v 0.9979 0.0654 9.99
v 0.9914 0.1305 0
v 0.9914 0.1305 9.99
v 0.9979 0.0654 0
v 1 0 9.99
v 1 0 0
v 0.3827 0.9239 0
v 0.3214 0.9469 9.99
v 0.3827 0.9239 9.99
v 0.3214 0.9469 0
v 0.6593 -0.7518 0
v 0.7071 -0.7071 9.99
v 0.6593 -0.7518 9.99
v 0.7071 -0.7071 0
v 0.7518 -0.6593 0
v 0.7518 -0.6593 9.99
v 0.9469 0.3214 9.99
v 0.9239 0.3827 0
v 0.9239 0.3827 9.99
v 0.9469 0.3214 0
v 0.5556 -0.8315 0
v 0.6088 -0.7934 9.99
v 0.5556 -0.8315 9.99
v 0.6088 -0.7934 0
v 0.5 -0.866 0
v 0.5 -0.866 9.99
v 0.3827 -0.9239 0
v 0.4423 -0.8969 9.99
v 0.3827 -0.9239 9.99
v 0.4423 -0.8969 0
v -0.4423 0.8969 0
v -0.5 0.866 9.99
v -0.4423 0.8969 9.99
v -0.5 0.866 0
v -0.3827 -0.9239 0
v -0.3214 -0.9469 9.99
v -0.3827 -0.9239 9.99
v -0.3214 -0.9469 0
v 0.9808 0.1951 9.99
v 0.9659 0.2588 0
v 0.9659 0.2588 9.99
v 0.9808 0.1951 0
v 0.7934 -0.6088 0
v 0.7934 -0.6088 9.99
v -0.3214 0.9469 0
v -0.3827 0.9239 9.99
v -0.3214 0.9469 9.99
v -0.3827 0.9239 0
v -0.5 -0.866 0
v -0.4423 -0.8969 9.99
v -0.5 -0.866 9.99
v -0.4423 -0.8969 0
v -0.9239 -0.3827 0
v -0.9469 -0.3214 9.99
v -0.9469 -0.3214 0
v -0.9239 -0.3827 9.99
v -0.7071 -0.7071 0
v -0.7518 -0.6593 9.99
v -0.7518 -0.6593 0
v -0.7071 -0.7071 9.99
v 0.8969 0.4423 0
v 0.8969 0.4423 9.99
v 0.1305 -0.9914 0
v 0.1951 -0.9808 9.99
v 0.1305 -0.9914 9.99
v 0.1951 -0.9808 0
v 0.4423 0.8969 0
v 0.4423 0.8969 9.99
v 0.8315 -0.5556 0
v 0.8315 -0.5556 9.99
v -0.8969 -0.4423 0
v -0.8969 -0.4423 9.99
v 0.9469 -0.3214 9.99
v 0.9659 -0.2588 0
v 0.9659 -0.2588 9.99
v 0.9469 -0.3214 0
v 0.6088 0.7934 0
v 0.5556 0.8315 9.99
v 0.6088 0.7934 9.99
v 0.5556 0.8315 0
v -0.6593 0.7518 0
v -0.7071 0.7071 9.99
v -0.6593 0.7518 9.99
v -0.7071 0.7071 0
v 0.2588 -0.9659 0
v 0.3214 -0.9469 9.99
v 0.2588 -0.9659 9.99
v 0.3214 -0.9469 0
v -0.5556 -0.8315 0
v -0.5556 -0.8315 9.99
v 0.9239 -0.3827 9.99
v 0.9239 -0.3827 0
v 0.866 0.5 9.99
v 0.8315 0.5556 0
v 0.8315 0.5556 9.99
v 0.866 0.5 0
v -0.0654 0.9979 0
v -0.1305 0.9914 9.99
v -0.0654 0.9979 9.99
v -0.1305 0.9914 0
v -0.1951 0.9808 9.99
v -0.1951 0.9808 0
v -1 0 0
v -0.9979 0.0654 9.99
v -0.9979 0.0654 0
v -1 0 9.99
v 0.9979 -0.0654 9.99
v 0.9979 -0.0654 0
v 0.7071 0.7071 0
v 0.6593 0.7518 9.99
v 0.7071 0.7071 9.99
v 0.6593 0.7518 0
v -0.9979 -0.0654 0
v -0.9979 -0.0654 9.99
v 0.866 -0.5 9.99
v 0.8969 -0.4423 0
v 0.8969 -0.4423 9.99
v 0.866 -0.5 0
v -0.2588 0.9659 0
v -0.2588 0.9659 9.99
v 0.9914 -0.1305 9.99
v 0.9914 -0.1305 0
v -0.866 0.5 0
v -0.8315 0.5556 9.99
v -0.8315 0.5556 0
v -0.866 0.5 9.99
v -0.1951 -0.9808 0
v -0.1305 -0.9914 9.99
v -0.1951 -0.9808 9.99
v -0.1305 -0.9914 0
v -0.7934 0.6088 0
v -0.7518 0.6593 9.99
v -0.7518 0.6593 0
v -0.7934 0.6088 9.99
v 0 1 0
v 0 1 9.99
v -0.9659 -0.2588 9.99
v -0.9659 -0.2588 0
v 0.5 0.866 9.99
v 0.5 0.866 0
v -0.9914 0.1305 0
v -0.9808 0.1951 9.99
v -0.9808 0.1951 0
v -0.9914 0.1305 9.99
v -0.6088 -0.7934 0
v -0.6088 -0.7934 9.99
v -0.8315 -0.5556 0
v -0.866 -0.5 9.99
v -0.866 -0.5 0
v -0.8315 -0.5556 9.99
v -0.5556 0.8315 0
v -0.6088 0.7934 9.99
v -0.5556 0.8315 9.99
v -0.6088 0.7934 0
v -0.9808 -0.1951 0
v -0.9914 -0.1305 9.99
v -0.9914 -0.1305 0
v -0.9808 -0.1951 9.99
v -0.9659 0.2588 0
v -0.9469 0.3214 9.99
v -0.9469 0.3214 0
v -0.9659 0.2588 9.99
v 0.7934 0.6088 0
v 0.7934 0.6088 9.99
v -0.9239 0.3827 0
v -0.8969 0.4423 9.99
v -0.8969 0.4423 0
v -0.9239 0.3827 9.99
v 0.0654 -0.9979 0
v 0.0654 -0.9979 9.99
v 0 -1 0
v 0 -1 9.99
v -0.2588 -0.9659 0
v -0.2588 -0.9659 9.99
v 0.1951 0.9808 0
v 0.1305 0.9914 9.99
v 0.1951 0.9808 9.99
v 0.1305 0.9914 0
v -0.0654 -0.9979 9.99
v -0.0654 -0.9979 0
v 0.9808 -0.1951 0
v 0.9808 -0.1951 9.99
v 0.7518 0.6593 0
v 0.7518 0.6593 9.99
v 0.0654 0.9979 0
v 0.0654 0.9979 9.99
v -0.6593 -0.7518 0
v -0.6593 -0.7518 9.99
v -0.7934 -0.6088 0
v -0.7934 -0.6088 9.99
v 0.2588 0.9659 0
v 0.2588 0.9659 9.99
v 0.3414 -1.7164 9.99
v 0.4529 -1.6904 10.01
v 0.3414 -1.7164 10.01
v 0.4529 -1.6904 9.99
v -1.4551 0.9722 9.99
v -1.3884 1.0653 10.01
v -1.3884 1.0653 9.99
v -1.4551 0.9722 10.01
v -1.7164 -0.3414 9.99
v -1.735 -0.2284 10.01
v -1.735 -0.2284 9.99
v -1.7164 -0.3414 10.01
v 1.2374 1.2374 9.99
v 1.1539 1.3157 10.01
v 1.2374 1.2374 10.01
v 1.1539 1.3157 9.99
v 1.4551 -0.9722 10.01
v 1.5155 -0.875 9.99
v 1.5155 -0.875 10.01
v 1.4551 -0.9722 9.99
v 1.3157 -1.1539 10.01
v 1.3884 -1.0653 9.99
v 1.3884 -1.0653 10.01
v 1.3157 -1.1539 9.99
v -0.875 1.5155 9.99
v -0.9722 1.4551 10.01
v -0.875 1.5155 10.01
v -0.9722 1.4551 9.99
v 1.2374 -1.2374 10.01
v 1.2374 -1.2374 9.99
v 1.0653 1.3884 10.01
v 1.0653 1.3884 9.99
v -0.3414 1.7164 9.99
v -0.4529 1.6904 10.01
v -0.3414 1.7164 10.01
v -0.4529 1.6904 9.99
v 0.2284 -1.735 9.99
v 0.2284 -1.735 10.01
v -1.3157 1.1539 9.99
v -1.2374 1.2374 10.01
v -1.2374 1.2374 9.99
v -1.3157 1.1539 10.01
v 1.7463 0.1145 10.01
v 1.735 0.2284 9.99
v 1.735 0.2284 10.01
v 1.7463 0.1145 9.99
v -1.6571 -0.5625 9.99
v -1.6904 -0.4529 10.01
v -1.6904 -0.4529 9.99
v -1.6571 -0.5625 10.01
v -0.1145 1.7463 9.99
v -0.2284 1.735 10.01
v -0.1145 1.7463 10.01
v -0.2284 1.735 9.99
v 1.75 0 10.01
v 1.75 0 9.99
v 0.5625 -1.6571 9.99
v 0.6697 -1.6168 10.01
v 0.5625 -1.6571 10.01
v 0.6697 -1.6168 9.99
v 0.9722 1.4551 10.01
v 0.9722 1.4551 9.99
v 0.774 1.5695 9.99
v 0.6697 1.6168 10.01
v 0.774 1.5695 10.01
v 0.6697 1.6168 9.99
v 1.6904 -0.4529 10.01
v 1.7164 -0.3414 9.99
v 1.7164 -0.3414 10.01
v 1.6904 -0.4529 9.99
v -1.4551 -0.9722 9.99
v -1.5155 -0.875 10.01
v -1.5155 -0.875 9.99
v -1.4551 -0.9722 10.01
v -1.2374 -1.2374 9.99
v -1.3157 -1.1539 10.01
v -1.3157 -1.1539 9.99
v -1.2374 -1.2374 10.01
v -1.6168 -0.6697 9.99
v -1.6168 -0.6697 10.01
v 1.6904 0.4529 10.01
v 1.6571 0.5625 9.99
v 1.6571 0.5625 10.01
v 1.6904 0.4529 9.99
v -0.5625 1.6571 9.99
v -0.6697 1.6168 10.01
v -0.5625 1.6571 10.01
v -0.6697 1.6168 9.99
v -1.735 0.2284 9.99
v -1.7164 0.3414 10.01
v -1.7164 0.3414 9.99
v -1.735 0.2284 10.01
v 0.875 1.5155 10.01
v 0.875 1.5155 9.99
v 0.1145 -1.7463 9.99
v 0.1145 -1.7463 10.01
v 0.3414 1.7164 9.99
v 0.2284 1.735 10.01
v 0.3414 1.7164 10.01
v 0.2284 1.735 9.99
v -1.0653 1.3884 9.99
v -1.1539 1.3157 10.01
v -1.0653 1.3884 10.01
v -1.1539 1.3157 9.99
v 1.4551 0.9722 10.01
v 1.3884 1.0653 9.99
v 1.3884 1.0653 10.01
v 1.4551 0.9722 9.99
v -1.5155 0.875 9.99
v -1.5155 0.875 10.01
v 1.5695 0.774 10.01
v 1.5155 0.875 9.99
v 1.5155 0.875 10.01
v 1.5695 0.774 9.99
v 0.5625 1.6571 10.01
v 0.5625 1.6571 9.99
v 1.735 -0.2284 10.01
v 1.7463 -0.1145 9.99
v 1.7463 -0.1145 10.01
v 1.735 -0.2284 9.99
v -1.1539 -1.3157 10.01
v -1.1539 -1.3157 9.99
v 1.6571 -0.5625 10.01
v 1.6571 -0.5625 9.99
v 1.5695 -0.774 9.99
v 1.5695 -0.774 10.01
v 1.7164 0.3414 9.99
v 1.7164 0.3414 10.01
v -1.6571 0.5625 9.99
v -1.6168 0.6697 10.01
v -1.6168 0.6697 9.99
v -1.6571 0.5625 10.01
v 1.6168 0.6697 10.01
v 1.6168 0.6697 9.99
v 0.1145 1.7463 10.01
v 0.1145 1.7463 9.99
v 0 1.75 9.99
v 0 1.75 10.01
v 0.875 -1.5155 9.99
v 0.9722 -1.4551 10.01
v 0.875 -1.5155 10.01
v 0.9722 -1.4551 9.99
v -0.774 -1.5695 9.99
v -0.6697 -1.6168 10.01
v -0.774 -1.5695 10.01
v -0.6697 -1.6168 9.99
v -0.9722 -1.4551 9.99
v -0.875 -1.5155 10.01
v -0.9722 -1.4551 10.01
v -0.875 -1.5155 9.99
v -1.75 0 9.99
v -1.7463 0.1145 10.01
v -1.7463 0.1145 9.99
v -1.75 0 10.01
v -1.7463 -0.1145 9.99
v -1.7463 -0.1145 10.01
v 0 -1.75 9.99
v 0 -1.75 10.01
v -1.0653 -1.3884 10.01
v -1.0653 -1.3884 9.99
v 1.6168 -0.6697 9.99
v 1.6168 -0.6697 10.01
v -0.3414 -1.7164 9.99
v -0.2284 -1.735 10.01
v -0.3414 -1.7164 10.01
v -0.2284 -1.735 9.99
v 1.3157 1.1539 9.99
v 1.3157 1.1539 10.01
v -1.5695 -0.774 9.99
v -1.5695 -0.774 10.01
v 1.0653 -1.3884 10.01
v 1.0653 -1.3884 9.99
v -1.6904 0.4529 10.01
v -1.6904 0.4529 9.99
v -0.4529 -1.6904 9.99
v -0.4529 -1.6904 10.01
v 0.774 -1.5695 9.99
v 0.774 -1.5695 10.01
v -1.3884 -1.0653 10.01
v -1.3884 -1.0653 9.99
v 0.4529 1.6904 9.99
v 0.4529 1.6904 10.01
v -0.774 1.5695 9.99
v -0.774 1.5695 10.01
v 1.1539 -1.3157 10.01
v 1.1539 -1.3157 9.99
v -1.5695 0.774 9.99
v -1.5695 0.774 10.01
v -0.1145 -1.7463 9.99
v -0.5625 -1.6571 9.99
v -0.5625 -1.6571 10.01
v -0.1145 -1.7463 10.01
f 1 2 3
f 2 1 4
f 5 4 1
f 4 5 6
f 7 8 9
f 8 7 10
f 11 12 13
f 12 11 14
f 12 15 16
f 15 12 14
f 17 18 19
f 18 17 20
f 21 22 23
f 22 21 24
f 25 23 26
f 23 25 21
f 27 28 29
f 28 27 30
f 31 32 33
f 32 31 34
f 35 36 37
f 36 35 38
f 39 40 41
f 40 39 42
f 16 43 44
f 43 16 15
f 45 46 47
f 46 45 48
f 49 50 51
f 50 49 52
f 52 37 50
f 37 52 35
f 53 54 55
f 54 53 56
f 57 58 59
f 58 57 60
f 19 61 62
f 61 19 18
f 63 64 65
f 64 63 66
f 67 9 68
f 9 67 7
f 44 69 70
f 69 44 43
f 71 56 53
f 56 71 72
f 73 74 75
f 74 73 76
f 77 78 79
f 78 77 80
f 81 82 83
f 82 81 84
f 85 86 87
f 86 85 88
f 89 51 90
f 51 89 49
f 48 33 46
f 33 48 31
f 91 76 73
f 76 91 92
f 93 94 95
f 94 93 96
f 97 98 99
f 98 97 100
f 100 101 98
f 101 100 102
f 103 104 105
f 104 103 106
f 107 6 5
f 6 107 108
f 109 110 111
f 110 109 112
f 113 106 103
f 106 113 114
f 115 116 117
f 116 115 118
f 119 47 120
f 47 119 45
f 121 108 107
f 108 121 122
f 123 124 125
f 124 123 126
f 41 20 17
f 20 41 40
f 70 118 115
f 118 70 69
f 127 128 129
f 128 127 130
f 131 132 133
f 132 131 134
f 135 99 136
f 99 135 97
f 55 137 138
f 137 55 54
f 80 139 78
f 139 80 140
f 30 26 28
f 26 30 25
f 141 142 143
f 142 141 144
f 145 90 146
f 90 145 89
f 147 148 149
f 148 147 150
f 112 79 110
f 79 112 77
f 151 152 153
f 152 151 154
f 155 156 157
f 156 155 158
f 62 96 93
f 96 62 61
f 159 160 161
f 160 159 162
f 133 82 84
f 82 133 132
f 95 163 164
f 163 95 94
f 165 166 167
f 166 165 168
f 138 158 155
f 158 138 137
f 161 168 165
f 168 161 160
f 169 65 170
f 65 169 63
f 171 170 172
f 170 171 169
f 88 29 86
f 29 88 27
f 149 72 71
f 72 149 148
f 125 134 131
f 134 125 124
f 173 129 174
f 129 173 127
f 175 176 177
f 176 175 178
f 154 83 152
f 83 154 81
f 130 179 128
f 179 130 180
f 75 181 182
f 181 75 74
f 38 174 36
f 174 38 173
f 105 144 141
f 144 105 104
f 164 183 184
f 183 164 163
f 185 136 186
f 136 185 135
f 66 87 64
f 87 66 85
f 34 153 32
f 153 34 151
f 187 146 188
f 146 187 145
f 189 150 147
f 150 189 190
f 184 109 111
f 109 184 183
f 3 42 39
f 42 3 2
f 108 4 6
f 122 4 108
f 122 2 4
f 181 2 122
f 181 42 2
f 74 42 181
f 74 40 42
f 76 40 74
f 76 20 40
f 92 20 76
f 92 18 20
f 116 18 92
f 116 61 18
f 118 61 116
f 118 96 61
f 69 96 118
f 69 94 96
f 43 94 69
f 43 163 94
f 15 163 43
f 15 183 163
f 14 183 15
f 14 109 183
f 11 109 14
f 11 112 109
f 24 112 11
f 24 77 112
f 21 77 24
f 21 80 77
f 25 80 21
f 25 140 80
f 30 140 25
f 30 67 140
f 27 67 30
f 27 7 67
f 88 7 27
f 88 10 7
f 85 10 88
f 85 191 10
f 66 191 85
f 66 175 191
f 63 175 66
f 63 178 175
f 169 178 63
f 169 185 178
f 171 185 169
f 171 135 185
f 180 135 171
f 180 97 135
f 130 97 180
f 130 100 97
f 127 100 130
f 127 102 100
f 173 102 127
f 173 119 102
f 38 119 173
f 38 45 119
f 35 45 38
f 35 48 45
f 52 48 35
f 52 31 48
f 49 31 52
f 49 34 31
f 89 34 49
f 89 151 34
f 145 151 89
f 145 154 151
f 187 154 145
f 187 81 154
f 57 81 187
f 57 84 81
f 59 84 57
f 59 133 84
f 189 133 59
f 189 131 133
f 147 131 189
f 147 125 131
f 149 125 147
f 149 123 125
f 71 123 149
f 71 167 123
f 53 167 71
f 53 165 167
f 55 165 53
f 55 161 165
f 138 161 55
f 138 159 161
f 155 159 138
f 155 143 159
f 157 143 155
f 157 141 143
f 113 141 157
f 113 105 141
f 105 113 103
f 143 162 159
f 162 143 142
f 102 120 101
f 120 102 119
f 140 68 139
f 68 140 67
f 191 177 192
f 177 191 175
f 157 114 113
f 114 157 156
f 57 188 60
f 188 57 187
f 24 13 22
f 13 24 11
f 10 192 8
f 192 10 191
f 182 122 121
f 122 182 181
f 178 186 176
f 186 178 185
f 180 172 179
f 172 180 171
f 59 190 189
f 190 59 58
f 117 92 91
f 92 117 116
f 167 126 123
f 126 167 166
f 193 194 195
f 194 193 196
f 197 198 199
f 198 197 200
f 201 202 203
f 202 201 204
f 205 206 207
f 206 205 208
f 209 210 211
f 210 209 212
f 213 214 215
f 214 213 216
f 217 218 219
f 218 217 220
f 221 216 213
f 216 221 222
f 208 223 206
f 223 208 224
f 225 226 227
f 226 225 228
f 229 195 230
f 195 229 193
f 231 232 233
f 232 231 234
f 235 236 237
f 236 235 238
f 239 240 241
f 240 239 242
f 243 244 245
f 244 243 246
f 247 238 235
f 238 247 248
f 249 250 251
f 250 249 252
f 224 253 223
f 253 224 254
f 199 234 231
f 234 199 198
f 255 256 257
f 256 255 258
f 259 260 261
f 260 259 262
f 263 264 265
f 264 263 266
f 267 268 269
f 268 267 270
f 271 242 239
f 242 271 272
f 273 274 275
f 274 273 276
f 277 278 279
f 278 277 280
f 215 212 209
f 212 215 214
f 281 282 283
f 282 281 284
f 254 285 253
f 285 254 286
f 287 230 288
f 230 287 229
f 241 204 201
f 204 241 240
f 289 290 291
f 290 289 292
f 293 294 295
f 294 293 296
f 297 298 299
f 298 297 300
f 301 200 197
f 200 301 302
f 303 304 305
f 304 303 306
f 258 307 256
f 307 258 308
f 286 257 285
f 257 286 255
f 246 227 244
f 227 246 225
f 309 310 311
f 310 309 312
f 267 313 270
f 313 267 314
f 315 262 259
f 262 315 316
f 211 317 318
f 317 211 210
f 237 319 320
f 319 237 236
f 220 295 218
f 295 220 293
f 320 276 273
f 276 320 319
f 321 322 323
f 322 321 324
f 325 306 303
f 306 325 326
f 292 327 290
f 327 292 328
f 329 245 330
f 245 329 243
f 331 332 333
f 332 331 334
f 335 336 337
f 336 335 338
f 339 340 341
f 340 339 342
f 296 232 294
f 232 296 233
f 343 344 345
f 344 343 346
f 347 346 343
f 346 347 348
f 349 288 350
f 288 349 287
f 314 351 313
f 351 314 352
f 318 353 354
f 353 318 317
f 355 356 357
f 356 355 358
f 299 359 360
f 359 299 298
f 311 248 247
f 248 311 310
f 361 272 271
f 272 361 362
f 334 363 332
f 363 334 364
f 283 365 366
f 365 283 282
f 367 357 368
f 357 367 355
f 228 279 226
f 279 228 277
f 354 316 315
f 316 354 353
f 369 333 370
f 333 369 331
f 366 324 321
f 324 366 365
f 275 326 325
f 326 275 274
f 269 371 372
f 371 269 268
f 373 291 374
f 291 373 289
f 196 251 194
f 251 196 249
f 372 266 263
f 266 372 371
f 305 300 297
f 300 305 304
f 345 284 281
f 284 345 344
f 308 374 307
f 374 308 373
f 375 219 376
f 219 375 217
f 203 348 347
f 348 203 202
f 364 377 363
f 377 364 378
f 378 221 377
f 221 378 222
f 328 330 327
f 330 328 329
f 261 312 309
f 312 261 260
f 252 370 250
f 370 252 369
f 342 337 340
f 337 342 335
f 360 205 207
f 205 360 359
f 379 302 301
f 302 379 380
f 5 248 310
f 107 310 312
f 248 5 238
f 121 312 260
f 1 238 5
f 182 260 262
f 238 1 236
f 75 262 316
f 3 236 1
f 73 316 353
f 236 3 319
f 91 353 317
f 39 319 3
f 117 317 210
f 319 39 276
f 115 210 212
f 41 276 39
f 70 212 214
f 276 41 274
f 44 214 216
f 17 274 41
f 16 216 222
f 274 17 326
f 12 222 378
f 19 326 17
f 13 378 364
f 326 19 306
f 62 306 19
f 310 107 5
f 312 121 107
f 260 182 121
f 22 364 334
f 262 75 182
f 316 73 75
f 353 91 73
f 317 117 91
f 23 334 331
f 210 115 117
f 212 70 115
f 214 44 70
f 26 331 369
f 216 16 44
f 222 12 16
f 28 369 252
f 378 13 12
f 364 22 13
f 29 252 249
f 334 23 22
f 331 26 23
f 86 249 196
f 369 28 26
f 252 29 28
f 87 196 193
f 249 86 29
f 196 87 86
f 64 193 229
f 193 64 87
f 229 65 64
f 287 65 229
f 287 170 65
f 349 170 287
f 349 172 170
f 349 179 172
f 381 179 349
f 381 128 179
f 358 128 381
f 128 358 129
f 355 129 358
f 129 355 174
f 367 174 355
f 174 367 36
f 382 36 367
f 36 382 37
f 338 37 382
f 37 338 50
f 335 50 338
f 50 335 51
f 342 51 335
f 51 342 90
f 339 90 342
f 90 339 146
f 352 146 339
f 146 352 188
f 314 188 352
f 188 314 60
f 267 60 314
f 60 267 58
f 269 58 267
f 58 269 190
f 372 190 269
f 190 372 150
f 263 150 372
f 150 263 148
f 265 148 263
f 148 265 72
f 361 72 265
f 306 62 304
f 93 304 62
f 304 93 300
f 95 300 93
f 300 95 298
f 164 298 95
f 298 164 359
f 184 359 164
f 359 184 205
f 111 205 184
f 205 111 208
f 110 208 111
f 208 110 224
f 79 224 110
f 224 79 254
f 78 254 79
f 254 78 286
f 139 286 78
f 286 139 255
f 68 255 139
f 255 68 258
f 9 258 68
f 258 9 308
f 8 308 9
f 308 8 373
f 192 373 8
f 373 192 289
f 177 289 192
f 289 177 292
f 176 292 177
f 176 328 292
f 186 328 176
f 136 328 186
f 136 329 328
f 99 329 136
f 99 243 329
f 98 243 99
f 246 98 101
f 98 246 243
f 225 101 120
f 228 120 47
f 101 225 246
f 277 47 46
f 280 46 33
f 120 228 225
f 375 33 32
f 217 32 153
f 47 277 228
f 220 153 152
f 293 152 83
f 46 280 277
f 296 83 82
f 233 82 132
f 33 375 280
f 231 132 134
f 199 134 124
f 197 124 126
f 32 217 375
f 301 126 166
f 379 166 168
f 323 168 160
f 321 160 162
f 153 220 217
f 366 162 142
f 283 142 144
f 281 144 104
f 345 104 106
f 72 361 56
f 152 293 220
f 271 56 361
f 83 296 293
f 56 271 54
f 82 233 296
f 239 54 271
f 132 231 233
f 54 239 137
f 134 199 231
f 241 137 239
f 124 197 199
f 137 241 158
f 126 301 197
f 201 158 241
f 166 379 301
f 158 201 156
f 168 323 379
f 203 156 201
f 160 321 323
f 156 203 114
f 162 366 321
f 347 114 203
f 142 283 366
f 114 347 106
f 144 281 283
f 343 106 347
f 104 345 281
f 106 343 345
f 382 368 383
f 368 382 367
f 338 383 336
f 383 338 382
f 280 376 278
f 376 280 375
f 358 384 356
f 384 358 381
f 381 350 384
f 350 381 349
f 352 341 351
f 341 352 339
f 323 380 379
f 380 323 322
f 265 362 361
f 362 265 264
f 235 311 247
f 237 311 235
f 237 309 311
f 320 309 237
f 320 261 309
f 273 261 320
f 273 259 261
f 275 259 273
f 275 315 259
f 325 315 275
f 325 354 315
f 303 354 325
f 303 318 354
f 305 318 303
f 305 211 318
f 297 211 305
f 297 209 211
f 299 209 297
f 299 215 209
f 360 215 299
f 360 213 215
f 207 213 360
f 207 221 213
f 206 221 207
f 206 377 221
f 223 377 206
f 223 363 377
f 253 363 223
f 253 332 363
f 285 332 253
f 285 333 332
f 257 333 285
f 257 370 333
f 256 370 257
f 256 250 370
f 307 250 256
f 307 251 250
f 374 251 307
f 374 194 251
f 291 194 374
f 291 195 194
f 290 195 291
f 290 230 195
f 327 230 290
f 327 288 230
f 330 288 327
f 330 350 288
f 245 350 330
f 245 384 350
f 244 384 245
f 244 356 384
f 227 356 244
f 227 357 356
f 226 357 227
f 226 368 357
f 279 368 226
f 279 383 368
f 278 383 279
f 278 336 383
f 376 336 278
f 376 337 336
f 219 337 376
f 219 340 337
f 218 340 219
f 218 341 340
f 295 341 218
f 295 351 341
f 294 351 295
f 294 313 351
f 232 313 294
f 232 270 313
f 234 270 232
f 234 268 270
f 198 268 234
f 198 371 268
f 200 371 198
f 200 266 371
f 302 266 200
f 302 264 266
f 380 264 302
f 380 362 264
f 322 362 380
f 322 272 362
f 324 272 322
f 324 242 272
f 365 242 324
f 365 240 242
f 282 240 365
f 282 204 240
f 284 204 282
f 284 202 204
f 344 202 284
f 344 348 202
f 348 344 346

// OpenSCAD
$fn = 96;

// Dimensions (mm)
shaft_d = 2.0;
length  = 10.0;

head_d  = 3.5;
head_h  = 1.3;

// Simple dome-head screw (unthreaded shaft)
module dome_head_screw(shaft_d, length, head_d, head_h) {
    union() {
        // Shaft
        cylinder(d = shaft_d, h = length);

        // Dome head: spherical cap blended to a short cylindrical collar
        // Choose a sphere radius that yields the desired cap height at base radius head_d/2
        r_base = head_d/2;
        h_cap  = head_h;

        // Sphere radius for a cap of height h_cap over base radius r_base:
        // R = (r_base^2 + h_cap^2) / (2*h_cap)
        R = (r_base*r_base + h_cap*h_cap) / (2*h_cap);

        // Place sphere so that the cap base plane is at z = length
        // Sphere center is at z = length + (h_cap - R)
        translate([0,0,length + (h_cap - R)])
            intersection() {
                sphere(r = R);
                // Keep only the cap above the base plane and within head diameter
                translate([0,0,length])
                    cylinder(r = r_base, h = h_cap);
            }

        // Small collar to ensure clean union at the base plane (very thin)
        translate([0,0,length - 0.01])
            cylinder(d = head_d, h = 0.02);
    }
}

dome_head_screw(shaft_d, length, head_d, head_h);
